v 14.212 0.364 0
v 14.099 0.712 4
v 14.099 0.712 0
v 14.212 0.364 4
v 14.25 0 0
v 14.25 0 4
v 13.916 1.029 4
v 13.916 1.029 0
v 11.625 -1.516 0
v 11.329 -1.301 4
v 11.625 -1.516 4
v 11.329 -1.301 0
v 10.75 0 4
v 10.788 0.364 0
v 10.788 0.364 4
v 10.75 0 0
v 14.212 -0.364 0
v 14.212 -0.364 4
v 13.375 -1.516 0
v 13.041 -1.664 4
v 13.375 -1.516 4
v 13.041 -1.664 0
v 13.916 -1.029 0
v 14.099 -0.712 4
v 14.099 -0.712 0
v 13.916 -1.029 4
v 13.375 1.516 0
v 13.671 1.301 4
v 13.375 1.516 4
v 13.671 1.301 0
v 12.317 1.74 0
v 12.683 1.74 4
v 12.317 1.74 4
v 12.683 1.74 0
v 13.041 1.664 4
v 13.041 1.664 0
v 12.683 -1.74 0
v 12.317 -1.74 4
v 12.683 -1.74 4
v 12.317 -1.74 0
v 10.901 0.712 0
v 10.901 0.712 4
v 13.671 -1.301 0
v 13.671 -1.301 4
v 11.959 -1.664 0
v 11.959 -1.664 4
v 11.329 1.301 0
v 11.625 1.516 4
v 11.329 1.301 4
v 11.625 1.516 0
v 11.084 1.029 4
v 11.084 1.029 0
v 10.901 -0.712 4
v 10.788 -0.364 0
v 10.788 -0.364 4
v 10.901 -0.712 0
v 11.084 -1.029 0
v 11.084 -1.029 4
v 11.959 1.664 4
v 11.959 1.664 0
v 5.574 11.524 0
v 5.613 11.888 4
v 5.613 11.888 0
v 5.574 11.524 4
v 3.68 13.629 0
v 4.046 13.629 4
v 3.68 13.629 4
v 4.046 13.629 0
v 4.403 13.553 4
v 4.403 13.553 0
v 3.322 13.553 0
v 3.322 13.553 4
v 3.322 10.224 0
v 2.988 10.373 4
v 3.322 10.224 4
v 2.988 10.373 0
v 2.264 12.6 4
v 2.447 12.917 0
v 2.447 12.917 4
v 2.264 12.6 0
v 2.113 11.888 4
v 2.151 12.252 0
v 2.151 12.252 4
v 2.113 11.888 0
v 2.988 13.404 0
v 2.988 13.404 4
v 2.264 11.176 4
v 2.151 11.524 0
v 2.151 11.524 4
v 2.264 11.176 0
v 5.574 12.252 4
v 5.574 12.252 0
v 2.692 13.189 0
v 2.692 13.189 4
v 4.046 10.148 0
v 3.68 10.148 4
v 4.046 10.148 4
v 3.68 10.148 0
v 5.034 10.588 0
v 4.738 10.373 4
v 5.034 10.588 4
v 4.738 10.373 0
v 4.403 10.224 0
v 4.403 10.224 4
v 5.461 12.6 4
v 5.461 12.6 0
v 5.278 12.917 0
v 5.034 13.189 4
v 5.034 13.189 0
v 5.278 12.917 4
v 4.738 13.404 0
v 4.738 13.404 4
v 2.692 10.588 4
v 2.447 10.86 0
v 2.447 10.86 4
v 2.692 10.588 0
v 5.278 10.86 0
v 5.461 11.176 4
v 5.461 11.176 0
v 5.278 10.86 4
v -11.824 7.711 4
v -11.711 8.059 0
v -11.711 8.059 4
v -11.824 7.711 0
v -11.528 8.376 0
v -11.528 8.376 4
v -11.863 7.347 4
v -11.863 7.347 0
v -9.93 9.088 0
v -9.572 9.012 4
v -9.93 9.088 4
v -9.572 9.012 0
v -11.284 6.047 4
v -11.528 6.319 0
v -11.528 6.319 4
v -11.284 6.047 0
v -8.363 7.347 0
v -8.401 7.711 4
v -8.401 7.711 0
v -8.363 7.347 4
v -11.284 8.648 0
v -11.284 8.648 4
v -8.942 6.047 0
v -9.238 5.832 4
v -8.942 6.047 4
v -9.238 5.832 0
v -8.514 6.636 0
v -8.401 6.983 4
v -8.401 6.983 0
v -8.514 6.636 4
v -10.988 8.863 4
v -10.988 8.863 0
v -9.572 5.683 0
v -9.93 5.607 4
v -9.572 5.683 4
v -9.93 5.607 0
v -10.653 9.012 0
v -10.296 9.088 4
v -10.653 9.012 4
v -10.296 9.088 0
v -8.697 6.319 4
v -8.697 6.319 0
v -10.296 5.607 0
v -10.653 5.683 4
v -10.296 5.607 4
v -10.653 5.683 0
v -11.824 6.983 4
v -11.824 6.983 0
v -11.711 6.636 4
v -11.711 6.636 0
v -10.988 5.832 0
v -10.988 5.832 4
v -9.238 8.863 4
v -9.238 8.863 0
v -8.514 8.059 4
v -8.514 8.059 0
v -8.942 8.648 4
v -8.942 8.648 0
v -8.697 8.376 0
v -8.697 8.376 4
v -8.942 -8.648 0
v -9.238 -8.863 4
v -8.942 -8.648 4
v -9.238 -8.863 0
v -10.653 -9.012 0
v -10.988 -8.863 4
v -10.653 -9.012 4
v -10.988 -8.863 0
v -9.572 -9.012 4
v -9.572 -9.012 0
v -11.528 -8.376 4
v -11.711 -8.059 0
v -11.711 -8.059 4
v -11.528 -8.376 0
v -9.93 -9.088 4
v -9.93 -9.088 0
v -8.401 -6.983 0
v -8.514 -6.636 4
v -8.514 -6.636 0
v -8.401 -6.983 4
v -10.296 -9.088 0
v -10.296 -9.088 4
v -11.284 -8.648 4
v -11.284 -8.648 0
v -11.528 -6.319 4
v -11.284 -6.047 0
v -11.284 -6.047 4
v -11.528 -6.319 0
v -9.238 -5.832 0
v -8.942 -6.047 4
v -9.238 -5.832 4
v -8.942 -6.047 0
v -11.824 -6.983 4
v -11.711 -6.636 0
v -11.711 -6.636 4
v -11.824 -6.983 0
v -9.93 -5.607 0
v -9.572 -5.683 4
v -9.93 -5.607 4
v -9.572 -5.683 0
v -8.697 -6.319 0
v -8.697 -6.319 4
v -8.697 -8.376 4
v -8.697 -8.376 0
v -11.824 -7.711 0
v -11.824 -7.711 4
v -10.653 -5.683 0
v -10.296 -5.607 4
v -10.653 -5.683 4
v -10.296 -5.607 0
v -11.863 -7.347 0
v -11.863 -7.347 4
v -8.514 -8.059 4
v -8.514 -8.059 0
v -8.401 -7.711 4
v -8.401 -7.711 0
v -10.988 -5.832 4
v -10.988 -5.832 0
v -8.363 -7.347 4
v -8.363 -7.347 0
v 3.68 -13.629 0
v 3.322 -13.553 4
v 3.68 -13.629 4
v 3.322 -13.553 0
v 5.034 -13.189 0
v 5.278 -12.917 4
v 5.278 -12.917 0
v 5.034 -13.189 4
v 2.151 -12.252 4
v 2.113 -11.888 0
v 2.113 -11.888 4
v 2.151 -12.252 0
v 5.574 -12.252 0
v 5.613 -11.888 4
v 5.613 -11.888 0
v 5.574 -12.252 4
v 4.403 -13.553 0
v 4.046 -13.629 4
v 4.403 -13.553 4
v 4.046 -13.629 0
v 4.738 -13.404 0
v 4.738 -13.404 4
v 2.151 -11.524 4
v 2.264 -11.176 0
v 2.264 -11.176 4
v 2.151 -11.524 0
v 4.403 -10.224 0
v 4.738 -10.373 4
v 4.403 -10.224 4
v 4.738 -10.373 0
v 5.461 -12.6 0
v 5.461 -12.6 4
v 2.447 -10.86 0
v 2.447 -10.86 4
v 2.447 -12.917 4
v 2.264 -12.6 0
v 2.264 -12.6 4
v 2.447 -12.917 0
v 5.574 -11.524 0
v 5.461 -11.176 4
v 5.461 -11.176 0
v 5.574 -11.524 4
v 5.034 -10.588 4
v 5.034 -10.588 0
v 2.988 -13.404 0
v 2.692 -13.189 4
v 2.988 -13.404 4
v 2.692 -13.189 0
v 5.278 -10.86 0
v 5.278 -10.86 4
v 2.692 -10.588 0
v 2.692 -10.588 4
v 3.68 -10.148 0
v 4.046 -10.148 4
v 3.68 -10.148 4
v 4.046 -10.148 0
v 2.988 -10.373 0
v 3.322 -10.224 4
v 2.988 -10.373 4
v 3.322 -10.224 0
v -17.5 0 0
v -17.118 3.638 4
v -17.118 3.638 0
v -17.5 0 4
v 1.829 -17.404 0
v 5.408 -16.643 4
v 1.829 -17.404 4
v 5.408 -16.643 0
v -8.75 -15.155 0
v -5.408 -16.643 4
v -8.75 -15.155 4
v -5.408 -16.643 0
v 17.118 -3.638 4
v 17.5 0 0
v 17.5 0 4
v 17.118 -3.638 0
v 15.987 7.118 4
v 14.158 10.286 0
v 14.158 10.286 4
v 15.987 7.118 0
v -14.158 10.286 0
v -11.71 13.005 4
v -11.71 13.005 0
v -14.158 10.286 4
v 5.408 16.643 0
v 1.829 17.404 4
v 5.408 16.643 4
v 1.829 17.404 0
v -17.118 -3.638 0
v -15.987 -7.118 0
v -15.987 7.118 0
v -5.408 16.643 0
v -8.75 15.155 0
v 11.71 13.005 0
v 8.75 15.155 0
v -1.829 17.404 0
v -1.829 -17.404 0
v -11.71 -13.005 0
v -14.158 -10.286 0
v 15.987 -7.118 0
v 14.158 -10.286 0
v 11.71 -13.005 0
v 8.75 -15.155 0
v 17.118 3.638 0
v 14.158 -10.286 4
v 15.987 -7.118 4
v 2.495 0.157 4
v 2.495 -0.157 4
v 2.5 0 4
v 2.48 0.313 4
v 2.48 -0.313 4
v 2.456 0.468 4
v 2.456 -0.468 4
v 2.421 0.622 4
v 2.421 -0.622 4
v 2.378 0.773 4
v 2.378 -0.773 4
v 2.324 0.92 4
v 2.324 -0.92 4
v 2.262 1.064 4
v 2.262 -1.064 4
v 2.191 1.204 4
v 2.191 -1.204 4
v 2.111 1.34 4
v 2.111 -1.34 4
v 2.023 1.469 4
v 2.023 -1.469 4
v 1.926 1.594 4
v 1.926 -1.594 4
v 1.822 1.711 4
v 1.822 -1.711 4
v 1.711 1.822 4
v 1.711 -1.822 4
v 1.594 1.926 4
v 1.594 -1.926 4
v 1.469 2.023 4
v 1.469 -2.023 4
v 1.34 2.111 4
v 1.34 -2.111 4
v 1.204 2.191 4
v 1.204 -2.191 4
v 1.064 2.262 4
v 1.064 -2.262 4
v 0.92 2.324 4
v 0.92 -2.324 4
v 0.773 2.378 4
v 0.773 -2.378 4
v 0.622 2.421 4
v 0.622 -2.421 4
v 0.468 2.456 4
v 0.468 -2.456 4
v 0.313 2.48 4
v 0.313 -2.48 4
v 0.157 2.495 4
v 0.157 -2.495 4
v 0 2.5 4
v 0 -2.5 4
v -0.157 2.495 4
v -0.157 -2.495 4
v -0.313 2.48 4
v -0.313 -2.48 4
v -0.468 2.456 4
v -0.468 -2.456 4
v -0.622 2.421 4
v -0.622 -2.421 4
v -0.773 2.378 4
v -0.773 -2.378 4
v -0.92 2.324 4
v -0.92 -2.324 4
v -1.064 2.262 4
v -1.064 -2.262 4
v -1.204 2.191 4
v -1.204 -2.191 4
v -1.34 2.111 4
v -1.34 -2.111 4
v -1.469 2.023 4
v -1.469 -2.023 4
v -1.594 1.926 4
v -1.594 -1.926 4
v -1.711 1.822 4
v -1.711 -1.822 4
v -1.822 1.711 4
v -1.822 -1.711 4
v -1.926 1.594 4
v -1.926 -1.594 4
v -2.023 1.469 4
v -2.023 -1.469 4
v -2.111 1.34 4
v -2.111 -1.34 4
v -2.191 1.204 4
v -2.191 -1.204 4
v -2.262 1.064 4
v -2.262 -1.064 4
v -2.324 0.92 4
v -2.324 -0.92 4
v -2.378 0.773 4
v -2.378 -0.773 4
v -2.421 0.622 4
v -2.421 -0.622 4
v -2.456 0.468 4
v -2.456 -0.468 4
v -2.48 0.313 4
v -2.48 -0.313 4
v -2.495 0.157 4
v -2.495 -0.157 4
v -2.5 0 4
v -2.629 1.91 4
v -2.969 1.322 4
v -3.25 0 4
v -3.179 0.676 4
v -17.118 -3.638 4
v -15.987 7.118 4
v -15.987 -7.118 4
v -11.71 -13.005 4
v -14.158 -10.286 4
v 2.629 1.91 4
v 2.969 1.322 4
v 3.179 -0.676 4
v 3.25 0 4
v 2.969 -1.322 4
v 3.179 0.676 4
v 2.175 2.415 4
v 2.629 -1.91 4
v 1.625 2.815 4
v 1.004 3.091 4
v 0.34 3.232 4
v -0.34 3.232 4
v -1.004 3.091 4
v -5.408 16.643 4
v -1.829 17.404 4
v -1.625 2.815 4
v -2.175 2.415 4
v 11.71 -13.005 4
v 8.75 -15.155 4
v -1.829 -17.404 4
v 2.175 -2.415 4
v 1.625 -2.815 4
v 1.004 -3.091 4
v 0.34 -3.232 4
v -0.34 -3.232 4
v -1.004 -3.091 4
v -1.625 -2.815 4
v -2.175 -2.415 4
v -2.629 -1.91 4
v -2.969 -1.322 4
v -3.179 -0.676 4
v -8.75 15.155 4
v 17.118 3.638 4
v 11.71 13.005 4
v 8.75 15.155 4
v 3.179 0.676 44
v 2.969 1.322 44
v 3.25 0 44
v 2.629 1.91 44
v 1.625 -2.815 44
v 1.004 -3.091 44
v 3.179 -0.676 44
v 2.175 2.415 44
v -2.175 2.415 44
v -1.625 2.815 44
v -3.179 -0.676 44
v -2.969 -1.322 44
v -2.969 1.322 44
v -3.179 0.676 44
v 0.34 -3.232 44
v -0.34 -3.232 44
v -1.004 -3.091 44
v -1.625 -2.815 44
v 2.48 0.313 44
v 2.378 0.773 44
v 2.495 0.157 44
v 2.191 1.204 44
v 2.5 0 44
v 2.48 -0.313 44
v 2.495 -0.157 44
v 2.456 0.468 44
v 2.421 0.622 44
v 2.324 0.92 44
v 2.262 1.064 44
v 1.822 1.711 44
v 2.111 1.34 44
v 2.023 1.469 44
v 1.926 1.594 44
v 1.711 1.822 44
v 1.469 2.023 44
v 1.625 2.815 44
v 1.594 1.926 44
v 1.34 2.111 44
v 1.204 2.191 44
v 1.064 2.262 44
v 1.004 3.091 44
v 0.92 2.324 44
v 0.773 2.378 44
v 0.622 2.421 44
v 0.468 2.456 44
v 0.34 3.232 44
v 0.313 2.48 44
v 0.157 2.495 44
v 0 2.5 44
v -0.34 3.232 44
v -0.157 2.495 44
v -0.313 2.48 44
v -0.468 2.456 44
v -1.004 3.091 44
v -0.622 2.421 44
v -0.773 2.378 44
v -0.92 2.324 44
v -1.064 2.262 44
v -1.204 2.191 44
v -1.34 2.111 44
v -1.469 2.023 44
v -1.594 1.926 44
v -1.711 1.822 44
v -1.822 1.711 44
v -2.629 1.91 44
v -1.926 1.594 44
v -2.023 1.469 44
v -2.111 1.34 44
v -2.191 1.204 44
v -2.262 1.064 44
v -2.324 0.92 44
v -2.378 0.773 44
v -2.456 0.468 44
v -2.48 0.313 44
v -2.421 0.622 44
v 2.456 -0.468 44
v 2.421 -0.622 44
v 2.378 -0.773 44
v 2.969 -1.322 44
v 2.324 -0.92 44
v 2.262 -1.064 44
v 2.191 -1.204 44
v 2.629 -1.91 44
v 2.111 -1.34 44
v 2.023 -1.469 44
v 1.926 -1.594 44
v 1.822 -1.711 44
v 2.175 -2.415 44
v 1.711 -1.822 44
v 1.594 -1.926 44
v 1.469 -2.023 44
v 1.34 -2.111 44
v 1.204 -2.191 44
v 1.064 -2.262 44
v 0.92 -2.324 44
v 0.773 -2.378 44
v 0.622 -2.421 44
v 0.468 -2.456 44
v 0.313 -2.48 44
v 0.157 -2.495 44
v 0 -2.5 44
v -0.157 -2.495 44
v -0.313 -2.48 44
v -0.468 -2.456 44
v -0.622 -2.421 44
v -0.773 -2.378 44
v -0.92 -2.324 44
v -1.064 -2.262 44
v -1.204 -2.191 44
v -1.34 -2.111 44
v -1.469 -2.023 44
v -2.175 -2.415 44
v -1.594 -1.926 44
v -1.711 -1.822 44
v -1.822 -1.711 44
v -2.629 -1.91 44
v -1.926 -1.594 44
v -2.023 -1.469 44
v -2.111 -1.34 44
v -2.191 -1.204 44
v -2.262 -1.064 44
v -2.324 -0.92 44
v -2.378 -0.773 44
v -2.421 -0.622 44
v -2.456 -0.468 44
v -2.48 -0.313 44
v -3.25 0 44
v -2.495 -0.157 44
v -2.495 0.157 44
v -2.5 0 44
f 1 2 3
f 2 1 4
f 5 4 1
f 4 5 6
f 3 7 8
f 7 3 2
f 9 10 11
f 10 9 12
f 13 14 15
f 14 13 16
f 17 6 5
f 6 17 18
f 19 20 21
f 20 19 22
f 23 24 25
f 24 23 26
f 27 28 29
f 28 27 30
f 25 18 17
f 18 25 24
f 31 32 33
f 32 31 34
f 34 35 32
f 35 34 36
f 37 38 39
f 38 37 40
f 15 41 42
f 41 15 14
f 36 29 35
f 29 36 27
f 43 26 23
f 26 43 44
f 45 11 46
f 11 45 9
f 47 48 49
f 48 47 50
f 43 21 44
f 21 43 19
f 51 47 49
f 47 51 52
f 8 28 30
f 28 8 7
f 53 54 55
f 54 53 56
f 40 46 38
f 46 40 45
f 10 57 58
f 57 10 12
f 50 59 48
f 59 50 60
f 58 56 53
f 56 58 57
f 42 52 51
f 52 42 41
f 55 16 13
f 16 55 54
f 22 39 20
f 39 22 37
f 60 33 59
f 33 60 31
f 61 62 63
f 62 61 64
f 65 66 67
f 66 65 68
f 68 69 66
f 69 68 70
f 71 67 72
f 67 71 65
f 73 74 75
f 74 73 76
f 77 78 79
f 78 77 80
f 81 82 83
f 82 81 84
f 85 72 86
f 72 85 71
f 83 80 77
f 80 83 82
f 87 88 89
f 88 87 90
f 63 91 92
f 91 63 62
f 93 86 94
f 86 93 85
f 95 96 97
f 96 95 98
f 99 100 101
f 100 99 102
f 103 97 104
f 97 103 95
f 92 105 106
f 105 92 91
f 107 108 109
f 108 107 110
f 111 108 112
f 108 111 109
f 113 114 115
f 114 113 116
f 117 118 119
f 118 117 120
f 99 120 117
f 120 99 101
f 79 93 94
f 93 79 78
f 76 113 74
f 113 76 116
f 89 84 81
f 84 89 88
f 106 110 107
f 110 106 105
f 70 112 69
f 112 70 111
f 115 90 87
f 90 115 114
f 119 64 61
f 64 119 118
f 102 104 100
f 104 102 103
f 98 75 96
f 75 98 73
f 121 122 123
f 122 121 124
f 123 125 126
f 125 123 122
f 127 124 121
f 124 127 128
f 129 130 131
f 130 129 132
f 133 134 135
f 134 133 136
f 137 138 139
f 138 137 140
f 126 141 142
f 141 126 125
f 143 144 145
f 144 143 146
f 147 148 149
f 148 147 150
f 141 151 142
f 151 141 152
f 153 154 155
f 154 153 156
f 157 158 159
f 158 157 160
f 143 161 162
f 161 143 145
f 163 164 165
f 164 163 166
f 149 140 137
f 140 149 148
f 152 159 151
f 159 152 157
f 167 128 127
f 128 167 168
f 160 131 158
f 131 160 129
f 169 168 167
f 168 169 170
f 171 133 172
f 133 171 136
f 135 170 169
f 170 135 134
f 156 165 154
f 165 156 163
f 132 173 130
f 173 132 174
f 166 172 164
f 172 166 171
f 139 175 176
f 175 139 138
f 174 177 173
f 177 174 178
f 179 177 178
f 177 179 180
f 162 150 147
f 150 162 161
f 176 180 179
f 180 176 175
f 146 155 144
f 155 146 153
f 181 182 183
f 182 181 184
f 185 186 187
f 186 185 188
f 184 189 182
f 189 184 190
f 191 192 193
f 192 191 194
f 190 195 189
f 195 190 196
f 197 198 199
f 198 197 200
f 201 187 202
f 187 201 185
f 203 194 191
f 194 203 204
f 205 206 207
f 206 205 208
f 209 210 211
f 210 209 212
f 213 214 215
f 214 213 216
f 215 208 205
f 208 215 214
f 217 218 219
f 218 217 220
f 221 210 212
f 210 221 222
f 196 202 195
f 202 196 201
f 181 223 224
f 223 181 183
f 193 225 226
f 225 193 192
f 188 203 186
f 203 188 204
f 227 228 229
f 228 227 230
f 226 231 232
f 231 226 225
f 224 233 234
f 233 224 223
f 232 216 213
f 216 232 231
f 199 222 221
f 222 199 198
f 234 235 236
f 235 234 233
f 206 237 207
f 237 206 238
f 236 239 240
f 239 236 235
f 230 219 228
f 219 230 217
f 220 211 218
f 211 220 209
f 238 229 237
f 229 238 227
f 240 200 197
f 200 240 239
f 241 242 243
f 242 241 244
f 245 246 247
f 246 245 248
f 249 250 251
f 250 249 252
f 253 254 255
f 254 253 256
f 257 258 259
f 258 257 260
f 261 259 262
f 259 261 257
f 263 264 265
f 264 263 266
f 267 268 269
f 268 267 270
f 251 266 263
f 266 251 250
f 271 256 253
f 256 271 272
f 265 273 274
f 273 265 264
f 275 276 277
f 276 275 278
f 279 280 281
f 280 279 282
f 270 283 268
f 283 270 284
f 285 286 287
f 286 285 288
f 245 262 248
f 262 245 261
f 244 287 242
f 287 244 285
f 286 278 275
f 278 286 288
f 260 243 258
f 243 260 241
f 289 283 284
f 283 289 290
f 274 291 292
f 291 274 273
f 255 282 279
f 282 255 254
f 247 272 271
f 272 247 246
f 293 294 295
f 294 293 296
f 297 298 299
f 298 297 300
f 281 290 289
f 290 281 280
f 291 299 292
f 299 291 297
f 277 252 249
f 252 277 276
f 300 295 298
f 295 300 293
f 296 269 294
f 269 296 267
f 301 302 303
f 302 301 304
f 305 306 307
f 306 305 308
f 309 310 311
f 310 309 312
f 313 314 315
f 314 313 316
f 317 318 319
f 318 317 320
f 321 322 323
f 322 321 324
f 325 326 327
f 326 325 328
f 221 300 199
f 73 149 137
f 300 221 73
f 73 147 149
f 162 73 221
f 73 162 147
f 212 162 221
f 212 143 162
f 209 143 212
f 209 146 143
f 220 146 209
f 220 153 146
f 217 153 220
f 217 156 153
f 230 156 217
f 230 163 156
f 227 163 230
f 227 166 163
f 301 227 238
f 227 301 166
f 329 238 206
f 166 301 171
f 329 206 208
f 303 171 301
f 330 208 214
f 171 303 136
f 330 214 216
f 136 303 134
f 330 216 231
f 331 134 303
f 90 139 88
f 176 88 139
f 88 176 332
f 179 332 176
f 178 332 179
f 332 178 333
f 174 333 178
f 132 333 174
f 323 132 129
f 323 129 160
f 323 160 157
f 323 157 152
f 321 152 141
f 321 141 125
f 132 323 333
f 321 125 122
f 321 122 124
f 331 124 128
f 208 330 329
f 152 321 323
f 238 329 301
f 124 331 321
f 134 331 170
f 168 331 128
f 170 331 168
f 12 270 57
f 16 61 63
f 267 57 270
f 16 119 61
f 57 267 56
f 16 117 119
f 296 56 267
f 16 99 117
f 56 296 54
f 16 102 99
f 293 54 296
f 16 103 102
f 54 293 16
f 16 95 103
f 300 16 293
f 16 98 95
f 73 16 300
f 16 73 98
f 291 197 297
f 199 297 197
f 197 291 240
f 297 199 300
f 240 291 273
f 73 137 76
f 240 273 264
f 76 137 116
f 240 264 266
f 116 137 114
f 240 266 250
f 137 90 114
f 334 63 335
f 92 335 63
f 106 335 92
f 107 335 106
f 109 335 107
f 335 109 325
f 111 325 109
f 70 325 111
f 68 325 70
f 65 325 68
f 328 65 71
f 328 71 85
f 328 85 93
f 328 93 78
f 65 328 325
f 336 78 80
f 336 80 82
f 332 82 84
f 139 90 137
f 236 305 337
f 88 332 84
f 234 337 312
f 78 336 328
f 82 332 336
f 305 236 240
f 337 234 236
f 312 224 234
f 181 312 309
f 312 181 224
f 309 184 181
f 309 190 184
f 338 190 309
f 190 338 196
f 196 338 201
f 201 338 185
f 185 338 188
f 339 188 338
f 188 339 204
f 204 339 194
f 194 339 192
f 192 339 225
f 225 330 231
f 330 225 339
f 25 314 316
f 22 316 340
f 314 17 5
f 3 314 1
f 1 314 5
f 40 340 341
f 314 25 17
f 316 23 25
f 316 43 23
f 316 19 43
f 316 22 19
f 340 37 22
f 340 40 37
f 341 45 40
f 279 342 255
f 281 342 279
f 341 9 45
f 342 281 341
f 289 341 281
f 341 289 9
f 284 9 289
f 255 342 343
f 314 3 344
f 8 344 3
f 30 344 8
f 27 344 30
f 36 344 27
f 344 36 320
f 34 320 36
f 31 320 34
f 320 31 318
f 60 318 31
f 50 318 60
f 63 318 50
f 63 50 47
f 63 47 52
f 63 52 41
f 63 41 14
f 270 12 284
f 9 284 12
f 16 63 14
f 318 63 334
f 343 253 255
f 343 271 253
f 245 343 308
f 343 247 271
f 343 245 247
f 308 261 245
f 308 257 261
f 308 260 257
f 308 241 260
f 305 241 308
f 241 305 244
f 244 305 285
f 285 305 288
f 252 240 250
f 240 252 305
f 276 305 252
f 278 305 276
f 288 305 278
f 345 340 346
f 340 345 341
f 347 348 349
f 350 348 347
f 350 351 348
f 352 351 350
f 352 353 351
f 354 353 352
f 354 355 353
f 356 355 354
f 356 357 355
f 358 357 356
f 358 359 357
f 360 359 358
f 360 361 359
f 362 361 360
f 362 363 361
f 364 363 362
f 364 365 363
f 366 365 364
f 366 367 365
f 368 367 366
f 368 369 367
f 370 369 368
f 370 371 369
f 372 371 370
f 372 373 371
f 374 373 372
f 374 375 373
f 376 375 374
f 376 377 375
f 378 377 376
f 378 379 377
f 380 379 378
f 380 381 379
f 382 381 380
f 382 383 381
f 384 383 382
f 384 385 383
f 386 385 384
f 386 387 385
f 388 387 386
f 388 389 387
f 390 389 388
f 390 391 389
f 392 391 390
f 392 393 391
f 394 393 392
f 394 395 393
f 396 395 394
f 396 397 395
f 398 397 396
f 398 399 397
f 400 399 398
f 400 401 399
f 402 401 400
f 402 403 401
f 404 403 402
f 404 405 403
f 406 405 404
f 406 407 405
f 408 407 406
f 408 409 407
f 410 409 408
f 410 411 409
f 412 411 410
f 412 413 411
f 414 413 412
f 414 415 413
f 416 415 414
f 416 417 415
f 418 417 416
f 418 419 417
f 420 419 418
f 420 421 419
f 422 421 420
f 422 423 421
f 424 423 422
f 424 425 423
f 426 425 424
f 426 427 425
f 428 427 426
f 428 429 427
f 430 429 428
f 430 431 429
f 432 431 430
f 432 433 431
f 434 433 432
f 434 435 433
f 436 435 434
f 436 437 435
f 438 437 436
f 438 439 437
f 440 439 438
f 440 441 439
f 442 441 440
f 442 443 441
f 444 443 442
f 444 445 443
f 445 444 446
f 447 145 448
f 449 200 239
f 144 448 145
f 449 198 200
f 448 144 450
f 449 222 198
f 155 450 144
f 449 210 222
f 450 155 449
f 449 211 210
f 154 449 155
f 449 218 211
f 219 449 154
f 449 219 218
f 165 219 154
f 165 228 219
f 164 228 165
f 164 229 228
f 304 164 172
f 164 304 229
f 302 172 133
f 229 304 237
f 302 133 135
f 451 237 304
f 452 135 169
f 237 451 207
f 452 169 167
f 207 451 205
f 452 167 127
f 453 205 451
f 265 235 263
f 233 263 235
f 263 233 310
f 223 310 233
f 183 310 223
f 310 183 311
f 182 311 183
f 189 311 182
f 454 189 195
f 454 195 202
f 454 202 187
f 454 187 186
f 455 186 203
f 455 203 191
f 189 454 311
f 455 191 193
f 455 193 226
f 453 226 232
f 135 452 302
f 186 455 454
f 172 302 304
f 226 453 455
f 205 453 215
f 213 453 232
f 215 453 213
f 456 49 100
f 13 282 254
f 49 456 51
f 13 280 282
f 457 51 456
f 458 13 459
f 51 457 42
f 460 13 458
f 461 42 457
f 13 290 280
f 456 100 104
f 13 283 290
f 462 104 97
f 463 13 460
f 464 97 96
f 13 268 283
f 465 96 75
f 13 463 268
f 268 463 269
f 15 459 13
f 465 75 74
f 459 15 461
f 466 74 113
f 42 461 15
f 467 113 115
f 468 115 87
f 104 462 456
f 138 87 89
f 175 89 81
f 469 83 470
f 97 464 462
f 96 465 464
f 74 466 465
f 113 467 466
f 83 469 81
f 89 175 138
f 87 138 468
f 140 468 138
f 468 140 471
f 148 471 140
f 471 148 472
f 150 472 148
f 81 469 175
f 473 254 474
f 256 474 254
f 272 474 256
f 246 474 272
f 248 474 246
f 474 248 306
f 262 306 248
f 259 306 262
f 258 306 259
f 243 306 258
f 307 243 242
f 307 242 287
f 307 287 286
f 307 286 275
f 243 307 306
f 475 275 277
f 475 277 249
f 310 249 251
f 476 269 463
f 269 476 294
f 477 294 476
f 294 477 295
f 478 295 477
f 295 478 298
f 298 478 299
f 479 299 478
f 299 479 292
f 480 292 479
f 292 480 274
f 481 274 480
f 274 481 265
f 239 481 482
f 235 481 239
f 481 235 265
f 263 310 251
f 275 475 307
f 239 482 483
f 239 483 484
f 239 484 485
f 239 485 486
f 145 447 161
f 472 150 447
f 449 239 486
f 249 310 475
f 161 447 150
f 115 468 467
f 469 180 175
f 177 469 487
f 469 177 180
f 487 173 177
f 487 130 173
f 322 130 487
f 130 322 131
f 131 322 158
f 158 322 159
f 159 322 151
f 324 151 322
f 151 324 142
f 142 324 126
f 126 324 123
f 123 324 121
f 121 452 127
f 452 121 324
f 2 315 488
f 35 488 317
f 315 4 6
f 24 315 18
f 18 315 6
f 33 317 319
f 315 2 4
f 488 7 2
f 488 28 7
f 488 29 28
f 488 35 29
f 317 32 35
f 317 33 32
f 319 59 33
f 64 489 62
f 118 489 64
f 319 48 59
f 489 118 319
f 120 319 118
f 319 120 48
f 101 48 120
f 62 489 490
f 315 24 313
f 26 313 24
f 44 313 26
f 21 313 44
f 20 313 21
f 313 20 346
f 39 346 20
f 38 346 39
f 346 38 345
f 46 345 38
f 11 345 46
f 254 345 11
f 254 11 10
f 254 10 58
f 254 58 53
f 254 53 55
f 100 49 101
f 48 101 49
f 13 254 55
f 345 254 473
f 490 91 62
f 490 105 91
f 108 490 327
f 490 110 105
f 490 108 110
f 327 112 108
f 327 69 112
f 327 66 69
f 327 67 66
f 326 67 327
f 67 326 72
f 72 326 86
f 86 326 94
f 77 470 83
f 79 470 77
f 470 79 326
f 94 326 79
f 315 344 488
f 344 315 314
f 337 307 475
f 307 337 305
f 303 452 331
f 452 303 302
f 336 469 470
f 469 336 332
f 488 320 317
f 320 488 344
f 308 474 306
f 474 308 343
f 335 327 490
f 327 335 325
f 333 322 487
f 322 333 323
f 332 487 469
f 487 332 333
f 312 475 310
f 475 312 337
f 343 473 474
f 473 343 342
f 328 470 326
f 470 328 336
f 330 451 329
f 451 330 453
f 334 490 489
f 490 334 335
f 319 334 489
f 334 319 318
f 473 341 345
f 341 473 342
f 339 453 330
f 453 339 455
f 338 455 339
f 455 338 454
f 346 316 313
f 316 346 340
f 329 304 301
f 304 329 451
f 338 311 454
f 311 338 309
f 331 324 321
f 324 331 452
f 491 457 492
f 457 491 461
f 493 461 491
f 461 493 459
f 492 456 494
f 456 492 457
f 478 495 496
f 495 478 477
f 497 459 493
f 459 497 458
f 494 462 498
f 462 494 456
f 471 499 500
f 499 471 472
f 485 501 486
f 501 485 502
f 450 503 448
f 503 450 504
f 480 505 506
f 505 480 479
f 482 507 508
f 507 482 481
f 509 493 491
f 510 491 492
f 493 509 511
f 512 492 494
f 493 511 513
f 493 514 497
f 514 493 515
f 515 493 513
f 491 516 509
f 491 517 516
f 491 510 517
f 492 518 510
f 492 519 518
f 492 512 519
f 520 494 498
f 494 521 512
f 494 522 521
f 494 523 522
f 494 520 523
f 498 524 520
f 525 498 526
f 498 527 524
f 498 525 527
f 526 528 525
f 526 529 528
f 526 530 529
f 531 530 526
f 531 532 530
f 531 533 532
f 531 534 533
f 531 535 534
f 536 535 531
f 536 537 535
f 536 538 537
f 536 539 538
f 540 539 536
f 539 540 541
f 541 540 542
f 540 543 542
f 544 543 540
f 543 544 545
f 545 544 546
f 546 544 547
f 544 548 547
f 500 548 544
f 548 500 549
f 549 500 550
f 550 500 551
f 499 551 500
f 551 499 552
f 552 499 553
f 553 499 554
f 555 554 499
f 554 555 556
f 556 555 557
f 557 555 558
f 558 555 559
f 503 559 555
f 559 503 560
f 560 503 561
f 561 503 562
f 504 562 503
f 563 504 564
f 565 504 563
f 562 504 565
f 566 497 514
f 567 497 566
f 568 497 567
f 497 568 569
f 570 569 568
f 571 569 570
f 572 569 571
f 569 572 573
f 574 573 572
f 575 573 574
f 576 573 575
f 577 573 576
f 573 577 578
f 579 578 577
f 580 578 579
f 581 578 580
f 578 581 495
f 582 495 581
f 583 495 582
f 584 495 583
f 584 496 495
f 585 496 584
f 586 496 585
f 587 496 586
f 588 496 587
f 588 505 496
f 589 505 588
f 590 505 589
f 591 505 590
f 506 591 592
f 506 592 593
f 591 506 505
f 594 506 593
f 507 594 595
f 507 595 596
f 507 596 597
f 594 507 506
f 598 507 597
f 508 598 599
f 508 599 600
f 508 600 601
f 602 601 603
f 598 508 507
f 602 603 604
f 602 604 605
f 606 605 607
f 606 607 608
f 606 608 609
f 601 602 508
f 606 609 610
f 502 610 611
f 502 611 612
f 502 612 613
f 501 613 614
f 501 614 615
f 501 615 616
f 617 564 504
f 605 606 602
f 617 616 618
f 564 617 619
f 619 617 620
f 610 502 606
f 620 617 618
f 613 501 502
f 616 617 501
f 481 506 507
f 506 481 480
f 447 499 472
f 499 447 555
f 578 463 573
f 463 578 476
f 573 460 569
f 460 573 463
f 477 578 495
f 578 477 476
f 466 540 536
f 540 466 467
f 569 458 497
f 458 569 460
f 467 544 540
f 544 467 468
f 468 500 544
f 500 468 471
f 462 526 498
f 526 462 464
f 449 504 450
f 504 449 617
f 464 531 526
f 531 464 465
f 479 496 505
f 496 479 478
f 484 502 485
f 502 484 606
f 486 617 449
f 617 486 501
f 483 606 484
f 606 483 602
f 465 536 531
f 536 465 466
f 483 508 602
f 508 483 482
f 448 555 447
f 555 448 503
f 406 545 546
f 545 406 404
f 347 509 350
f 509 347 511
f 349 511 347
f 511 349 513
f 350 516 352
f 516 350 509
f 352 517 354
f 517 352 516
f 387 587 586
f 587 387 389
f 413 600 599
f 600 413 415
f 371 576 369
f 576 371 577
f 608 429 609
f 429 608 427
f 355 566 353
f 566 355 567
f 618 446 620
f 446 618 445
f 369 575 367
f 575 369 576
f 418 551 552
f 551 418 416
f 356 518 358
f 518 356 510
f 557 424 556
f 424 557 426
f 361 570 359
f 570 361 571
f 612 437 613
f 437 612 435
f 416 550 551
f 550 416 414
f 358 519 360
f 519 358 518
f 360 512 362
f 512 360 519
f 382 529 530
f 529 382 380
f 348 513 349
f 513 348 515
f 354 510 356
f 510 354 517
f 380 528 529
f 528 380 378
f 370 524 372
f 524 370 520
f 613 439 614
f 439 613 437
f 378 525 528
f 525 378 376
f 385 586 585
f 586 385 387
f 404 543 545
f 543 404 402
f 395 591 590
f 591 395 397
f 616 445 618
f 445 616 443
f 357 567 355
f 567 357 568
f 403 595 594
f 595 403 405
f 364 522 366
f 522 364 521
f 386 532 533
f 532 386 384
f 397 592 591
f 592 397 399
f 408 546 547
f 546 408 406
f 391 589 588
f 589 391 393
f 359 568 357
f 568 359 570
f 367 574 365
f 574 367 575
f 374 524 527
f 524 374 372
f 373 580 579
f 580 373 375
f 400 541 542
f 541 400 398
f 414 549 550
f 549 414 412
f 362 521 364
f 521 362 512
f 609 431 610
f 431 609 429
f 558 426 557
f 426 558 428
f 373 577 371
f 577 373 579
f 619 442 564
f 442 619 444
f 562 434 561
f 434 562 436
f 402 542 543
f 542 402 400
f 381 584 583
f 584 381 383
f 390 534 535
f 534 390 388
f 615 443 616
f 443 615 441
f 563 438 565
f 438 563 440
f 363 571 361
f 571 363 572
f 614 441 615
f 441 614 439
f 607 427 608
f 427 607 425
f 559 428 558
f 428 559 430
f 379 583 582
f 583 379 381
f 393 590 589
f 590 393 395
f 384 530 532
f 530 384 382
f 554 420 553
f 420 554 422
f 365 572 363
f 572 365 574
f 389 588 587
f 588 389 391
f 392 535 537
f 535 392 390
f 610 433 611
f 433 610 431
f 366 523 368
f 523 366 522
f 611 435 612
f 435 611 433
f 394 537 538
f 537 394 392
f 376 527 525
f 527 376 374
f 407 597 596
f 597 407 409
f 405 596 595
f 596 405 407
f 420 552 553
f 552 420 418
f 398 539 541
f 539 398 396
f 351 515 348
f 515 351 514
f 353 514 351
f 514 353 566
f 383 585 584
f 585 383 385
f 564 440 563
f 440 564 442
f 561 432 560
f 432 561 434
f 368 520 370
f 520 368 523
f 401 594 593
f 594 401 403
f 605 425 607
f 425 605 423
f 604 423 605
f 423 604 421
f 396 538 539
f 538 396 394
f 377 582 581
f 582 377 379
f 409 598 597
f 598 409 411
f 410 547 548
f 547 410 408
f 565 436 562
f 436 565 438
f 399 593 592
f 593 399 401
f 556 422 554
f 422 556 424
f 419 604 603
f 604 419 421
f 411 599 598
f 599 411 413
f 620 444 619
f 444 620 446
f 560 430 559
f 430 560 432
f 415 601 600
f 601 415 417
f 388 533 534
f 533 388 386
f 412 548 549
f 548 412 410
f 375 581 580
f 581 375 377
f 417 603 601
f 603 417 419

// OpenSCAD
eps = 0.01;
rod_d = 5;
mount_h = 40;

module rod_mount()
{
  base_h = 4;
  base_d = 35;
  // base
  difference()
  {
    cylinder(d=base_d, h=base_h);
    n=5;
    for(i=[0:n-1])
      rotate([0, 0, 1]*(i/n*360))
        translate([base_d/2-5, 0, -eps])
          cylinder(d=3.5, h=base_h+2*eps, $fn=30);
  }
  // main block
  translate([0, 0, base_h])
    difference()
    {
      cylinder(d=rod_d+1.5, h=mount_h, $fn=30);
      cylinder(d=rod_d, h=mount_h+eps, $fn=100);
    }
}


rod_mount();
